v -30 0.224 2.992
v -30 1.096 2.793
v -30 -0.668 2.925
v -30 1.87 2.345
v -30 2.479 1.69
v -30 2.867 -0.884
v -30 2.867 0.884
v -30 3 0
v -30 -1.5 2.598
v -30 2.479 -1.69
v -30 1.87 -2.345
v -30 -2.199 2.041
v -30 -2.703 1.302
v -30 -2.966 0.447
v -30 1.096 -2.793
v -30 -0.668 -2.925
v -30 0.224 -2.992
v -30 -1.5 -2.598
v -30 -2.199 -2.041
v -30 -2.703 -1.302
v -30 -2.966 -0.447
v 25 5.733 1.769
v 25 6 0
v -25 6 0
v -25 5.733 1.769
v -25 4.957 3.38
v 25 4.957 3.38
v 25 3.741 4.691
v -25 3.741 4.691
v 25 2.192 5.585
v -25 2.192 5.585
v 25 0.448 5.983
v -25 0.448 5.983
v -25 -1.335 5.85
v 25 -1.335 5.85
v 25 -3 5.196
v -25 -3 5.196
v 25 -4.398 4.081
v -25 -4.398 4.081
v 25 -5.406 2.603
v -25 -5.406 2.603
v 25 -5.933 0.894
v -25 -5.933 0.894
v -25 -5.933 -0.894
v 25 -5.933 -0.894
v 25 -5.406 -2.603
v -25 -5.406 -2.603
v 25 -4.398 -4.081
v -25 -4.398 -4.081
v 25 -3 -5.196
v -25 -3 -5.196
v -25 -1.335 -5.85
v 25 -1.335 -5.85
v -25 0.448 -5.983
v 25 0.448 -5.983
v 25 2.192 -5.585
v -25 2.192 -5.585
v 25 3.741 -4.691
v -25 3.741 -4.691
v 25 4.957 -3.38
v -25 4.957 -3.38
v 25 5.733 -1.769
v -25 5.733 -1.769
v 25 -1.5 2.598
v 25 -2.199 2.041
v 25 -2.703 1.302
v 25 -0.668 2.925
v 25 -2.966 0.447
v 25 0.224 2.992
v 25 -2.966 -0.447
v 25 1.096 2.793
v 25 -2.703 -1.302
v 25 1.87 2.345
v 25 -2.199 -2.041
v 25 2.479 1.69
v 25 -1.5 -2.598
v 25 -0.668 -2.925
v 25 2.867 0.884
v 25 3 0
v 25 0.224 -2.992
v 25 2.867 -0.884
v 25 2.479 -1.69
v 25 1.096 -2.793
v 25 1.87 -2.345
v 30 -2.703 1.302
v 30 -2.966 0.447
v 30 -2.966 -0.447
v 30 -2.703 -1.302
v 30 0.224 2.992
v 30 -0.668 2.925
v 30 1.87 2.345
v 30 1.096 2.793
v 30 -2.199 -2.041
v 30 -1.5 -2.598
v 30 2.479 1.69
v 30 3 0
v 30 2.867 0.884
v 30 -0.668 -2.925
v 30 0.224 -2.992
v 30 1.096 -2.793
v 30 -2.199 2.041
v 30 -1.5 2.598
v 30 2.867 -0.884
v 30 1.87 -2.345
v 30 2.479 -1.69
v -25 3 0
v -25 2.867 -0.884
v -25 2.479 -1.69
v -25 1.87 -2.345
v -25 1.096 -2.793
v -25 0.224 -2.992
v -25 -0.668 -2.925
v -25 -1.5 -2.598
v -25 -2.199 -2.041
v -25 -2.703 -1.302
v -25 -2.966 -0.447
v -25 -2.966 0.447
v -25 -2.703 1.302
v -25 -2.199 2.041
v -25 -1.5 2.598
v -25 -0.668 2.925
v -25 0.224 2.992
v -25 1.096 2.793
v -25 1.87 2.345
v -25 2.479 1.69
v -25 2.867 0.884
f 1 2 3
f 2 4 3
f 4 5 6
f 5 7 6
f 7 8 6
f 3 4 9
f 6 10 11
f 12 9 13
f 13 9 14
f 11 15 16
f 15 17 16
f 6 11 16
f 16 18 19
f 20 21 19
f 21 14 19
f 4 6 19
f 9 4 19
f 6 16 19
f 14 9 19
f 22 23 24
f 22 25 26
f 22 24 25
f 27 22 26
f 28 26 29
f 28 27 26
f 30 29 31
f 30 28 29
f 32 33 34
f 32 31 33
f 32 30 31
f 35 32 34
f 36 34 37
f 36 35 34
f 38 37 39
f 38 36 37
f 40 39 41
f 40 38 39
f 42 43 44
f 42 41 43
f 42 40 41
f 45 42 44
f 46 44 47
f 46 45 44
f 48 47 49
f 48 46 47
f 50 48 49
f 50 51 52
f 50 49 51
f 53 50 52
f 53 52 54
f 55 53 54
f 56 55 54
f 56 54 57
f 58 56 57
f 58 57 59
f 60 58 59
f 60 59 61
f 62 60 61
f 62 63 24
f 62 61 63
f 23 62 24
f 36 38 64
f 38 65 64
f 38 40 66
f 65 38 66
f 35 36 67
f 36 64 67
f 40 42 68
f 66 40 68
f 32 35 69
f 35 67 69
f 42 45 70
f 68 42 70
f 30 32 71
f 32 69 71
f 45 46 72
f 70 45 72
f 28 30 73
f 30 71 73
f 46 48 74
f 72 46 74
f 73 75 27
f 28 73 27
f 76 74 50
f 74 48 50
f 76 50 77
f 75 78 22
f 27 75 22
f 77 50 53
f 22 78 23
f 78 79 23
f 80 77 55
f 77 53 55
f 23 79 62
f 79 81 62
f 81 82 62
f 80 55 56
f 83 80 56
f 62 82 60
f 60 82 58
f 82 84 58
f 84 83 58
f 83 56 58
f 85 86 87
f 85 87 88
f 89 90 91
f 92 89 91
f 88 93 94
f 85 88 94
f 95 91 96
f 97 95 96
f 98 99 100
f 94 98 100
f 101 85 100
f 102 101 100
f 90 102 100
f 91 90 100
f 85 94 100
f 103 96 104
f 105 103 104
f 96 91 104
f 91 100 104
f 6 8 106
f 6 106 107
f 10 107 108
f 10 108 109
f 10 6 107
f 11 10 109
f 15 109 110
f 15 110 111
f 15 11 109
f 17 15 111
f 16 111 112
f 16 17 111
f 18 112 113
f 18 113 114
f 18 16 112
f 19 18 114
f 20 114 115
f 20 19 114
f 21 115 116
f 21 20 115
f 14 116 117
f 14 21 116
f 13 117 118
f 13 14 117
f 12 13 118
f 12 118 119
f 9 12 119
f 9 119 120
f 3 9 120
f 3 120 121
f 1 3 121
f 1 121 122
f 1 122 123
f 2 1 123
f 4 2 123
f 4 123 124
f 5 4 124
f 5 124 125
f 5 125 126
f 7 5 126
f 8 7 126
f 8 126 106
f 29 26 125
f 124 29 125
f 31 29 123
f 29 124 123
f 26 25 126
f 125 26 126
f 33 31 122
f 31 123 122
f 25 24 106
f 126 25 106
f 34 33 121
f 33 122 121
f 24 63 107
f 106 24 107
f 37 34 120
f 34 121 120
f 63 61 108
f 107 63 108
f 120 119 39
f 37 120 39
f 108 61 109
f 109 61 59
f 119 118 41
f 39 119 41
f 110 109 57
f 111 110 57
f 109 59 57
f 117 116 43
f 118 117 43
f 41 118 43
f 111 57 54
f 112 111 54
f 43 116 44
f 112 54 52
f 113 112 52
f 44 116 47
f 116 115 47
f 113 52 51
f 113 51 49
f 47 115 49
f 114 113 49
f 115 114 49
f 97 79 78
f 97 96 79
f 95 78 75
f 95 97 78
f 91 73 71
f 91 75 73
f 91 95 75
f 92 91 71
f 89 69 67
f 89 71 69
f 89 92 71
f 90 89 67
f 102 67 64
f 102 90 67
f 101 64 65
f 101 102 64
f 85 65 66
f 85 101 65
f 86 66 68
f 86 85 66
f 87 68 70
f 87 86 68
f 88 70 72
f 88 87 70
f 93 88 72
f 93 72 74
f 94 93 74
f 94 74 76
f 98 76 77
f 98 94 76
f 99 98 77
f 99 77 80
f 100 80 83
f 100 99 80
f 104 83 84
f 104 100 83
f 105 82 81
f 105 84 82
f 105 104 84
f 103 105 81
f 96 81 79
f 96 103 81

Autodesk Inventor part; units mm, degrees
ref_plane "YZ Plane" through (0, 0, 0) normal (1, 0, 0) x (0, 1, 0)
ref_plane "XZ Plane" through (0, 0, 0) normal (0, 1, 0) x (-1, 0, 0)
ref_plane "XY Plane" through (0, 0, 0) normal (0, 0, 1) x (1, 0, 0)
sketch "Sketch1" plane through (0, 0, 0) normal (0, 0, 1) x (1, 0, 0)
  line L0 (0, 0) -> (0, 6)
  line L1 (0, 6) -> (25, 6)
  line L2 (25, 6) -> (25, 3)
  line L3 (25, 3) -> (30, 3)
  line L4 (30, 3) -> (30, 0)
  line L5 (30, 0) -> (0, 0)
  dimension "d0" = 6
  dimension "d1" = 3
  dimension "d2" = 5
  dimension "d3" = 25
revolve "Revolution1" add sketch "Sketch1" angle 360 about axis through (30, 0, 0) along (-1, 0, 0)
mirror "Mirror1" about plane through (0, 3, 0) normal (-1, 0, 0) of "Revolution1"
properties part number "Roller"
